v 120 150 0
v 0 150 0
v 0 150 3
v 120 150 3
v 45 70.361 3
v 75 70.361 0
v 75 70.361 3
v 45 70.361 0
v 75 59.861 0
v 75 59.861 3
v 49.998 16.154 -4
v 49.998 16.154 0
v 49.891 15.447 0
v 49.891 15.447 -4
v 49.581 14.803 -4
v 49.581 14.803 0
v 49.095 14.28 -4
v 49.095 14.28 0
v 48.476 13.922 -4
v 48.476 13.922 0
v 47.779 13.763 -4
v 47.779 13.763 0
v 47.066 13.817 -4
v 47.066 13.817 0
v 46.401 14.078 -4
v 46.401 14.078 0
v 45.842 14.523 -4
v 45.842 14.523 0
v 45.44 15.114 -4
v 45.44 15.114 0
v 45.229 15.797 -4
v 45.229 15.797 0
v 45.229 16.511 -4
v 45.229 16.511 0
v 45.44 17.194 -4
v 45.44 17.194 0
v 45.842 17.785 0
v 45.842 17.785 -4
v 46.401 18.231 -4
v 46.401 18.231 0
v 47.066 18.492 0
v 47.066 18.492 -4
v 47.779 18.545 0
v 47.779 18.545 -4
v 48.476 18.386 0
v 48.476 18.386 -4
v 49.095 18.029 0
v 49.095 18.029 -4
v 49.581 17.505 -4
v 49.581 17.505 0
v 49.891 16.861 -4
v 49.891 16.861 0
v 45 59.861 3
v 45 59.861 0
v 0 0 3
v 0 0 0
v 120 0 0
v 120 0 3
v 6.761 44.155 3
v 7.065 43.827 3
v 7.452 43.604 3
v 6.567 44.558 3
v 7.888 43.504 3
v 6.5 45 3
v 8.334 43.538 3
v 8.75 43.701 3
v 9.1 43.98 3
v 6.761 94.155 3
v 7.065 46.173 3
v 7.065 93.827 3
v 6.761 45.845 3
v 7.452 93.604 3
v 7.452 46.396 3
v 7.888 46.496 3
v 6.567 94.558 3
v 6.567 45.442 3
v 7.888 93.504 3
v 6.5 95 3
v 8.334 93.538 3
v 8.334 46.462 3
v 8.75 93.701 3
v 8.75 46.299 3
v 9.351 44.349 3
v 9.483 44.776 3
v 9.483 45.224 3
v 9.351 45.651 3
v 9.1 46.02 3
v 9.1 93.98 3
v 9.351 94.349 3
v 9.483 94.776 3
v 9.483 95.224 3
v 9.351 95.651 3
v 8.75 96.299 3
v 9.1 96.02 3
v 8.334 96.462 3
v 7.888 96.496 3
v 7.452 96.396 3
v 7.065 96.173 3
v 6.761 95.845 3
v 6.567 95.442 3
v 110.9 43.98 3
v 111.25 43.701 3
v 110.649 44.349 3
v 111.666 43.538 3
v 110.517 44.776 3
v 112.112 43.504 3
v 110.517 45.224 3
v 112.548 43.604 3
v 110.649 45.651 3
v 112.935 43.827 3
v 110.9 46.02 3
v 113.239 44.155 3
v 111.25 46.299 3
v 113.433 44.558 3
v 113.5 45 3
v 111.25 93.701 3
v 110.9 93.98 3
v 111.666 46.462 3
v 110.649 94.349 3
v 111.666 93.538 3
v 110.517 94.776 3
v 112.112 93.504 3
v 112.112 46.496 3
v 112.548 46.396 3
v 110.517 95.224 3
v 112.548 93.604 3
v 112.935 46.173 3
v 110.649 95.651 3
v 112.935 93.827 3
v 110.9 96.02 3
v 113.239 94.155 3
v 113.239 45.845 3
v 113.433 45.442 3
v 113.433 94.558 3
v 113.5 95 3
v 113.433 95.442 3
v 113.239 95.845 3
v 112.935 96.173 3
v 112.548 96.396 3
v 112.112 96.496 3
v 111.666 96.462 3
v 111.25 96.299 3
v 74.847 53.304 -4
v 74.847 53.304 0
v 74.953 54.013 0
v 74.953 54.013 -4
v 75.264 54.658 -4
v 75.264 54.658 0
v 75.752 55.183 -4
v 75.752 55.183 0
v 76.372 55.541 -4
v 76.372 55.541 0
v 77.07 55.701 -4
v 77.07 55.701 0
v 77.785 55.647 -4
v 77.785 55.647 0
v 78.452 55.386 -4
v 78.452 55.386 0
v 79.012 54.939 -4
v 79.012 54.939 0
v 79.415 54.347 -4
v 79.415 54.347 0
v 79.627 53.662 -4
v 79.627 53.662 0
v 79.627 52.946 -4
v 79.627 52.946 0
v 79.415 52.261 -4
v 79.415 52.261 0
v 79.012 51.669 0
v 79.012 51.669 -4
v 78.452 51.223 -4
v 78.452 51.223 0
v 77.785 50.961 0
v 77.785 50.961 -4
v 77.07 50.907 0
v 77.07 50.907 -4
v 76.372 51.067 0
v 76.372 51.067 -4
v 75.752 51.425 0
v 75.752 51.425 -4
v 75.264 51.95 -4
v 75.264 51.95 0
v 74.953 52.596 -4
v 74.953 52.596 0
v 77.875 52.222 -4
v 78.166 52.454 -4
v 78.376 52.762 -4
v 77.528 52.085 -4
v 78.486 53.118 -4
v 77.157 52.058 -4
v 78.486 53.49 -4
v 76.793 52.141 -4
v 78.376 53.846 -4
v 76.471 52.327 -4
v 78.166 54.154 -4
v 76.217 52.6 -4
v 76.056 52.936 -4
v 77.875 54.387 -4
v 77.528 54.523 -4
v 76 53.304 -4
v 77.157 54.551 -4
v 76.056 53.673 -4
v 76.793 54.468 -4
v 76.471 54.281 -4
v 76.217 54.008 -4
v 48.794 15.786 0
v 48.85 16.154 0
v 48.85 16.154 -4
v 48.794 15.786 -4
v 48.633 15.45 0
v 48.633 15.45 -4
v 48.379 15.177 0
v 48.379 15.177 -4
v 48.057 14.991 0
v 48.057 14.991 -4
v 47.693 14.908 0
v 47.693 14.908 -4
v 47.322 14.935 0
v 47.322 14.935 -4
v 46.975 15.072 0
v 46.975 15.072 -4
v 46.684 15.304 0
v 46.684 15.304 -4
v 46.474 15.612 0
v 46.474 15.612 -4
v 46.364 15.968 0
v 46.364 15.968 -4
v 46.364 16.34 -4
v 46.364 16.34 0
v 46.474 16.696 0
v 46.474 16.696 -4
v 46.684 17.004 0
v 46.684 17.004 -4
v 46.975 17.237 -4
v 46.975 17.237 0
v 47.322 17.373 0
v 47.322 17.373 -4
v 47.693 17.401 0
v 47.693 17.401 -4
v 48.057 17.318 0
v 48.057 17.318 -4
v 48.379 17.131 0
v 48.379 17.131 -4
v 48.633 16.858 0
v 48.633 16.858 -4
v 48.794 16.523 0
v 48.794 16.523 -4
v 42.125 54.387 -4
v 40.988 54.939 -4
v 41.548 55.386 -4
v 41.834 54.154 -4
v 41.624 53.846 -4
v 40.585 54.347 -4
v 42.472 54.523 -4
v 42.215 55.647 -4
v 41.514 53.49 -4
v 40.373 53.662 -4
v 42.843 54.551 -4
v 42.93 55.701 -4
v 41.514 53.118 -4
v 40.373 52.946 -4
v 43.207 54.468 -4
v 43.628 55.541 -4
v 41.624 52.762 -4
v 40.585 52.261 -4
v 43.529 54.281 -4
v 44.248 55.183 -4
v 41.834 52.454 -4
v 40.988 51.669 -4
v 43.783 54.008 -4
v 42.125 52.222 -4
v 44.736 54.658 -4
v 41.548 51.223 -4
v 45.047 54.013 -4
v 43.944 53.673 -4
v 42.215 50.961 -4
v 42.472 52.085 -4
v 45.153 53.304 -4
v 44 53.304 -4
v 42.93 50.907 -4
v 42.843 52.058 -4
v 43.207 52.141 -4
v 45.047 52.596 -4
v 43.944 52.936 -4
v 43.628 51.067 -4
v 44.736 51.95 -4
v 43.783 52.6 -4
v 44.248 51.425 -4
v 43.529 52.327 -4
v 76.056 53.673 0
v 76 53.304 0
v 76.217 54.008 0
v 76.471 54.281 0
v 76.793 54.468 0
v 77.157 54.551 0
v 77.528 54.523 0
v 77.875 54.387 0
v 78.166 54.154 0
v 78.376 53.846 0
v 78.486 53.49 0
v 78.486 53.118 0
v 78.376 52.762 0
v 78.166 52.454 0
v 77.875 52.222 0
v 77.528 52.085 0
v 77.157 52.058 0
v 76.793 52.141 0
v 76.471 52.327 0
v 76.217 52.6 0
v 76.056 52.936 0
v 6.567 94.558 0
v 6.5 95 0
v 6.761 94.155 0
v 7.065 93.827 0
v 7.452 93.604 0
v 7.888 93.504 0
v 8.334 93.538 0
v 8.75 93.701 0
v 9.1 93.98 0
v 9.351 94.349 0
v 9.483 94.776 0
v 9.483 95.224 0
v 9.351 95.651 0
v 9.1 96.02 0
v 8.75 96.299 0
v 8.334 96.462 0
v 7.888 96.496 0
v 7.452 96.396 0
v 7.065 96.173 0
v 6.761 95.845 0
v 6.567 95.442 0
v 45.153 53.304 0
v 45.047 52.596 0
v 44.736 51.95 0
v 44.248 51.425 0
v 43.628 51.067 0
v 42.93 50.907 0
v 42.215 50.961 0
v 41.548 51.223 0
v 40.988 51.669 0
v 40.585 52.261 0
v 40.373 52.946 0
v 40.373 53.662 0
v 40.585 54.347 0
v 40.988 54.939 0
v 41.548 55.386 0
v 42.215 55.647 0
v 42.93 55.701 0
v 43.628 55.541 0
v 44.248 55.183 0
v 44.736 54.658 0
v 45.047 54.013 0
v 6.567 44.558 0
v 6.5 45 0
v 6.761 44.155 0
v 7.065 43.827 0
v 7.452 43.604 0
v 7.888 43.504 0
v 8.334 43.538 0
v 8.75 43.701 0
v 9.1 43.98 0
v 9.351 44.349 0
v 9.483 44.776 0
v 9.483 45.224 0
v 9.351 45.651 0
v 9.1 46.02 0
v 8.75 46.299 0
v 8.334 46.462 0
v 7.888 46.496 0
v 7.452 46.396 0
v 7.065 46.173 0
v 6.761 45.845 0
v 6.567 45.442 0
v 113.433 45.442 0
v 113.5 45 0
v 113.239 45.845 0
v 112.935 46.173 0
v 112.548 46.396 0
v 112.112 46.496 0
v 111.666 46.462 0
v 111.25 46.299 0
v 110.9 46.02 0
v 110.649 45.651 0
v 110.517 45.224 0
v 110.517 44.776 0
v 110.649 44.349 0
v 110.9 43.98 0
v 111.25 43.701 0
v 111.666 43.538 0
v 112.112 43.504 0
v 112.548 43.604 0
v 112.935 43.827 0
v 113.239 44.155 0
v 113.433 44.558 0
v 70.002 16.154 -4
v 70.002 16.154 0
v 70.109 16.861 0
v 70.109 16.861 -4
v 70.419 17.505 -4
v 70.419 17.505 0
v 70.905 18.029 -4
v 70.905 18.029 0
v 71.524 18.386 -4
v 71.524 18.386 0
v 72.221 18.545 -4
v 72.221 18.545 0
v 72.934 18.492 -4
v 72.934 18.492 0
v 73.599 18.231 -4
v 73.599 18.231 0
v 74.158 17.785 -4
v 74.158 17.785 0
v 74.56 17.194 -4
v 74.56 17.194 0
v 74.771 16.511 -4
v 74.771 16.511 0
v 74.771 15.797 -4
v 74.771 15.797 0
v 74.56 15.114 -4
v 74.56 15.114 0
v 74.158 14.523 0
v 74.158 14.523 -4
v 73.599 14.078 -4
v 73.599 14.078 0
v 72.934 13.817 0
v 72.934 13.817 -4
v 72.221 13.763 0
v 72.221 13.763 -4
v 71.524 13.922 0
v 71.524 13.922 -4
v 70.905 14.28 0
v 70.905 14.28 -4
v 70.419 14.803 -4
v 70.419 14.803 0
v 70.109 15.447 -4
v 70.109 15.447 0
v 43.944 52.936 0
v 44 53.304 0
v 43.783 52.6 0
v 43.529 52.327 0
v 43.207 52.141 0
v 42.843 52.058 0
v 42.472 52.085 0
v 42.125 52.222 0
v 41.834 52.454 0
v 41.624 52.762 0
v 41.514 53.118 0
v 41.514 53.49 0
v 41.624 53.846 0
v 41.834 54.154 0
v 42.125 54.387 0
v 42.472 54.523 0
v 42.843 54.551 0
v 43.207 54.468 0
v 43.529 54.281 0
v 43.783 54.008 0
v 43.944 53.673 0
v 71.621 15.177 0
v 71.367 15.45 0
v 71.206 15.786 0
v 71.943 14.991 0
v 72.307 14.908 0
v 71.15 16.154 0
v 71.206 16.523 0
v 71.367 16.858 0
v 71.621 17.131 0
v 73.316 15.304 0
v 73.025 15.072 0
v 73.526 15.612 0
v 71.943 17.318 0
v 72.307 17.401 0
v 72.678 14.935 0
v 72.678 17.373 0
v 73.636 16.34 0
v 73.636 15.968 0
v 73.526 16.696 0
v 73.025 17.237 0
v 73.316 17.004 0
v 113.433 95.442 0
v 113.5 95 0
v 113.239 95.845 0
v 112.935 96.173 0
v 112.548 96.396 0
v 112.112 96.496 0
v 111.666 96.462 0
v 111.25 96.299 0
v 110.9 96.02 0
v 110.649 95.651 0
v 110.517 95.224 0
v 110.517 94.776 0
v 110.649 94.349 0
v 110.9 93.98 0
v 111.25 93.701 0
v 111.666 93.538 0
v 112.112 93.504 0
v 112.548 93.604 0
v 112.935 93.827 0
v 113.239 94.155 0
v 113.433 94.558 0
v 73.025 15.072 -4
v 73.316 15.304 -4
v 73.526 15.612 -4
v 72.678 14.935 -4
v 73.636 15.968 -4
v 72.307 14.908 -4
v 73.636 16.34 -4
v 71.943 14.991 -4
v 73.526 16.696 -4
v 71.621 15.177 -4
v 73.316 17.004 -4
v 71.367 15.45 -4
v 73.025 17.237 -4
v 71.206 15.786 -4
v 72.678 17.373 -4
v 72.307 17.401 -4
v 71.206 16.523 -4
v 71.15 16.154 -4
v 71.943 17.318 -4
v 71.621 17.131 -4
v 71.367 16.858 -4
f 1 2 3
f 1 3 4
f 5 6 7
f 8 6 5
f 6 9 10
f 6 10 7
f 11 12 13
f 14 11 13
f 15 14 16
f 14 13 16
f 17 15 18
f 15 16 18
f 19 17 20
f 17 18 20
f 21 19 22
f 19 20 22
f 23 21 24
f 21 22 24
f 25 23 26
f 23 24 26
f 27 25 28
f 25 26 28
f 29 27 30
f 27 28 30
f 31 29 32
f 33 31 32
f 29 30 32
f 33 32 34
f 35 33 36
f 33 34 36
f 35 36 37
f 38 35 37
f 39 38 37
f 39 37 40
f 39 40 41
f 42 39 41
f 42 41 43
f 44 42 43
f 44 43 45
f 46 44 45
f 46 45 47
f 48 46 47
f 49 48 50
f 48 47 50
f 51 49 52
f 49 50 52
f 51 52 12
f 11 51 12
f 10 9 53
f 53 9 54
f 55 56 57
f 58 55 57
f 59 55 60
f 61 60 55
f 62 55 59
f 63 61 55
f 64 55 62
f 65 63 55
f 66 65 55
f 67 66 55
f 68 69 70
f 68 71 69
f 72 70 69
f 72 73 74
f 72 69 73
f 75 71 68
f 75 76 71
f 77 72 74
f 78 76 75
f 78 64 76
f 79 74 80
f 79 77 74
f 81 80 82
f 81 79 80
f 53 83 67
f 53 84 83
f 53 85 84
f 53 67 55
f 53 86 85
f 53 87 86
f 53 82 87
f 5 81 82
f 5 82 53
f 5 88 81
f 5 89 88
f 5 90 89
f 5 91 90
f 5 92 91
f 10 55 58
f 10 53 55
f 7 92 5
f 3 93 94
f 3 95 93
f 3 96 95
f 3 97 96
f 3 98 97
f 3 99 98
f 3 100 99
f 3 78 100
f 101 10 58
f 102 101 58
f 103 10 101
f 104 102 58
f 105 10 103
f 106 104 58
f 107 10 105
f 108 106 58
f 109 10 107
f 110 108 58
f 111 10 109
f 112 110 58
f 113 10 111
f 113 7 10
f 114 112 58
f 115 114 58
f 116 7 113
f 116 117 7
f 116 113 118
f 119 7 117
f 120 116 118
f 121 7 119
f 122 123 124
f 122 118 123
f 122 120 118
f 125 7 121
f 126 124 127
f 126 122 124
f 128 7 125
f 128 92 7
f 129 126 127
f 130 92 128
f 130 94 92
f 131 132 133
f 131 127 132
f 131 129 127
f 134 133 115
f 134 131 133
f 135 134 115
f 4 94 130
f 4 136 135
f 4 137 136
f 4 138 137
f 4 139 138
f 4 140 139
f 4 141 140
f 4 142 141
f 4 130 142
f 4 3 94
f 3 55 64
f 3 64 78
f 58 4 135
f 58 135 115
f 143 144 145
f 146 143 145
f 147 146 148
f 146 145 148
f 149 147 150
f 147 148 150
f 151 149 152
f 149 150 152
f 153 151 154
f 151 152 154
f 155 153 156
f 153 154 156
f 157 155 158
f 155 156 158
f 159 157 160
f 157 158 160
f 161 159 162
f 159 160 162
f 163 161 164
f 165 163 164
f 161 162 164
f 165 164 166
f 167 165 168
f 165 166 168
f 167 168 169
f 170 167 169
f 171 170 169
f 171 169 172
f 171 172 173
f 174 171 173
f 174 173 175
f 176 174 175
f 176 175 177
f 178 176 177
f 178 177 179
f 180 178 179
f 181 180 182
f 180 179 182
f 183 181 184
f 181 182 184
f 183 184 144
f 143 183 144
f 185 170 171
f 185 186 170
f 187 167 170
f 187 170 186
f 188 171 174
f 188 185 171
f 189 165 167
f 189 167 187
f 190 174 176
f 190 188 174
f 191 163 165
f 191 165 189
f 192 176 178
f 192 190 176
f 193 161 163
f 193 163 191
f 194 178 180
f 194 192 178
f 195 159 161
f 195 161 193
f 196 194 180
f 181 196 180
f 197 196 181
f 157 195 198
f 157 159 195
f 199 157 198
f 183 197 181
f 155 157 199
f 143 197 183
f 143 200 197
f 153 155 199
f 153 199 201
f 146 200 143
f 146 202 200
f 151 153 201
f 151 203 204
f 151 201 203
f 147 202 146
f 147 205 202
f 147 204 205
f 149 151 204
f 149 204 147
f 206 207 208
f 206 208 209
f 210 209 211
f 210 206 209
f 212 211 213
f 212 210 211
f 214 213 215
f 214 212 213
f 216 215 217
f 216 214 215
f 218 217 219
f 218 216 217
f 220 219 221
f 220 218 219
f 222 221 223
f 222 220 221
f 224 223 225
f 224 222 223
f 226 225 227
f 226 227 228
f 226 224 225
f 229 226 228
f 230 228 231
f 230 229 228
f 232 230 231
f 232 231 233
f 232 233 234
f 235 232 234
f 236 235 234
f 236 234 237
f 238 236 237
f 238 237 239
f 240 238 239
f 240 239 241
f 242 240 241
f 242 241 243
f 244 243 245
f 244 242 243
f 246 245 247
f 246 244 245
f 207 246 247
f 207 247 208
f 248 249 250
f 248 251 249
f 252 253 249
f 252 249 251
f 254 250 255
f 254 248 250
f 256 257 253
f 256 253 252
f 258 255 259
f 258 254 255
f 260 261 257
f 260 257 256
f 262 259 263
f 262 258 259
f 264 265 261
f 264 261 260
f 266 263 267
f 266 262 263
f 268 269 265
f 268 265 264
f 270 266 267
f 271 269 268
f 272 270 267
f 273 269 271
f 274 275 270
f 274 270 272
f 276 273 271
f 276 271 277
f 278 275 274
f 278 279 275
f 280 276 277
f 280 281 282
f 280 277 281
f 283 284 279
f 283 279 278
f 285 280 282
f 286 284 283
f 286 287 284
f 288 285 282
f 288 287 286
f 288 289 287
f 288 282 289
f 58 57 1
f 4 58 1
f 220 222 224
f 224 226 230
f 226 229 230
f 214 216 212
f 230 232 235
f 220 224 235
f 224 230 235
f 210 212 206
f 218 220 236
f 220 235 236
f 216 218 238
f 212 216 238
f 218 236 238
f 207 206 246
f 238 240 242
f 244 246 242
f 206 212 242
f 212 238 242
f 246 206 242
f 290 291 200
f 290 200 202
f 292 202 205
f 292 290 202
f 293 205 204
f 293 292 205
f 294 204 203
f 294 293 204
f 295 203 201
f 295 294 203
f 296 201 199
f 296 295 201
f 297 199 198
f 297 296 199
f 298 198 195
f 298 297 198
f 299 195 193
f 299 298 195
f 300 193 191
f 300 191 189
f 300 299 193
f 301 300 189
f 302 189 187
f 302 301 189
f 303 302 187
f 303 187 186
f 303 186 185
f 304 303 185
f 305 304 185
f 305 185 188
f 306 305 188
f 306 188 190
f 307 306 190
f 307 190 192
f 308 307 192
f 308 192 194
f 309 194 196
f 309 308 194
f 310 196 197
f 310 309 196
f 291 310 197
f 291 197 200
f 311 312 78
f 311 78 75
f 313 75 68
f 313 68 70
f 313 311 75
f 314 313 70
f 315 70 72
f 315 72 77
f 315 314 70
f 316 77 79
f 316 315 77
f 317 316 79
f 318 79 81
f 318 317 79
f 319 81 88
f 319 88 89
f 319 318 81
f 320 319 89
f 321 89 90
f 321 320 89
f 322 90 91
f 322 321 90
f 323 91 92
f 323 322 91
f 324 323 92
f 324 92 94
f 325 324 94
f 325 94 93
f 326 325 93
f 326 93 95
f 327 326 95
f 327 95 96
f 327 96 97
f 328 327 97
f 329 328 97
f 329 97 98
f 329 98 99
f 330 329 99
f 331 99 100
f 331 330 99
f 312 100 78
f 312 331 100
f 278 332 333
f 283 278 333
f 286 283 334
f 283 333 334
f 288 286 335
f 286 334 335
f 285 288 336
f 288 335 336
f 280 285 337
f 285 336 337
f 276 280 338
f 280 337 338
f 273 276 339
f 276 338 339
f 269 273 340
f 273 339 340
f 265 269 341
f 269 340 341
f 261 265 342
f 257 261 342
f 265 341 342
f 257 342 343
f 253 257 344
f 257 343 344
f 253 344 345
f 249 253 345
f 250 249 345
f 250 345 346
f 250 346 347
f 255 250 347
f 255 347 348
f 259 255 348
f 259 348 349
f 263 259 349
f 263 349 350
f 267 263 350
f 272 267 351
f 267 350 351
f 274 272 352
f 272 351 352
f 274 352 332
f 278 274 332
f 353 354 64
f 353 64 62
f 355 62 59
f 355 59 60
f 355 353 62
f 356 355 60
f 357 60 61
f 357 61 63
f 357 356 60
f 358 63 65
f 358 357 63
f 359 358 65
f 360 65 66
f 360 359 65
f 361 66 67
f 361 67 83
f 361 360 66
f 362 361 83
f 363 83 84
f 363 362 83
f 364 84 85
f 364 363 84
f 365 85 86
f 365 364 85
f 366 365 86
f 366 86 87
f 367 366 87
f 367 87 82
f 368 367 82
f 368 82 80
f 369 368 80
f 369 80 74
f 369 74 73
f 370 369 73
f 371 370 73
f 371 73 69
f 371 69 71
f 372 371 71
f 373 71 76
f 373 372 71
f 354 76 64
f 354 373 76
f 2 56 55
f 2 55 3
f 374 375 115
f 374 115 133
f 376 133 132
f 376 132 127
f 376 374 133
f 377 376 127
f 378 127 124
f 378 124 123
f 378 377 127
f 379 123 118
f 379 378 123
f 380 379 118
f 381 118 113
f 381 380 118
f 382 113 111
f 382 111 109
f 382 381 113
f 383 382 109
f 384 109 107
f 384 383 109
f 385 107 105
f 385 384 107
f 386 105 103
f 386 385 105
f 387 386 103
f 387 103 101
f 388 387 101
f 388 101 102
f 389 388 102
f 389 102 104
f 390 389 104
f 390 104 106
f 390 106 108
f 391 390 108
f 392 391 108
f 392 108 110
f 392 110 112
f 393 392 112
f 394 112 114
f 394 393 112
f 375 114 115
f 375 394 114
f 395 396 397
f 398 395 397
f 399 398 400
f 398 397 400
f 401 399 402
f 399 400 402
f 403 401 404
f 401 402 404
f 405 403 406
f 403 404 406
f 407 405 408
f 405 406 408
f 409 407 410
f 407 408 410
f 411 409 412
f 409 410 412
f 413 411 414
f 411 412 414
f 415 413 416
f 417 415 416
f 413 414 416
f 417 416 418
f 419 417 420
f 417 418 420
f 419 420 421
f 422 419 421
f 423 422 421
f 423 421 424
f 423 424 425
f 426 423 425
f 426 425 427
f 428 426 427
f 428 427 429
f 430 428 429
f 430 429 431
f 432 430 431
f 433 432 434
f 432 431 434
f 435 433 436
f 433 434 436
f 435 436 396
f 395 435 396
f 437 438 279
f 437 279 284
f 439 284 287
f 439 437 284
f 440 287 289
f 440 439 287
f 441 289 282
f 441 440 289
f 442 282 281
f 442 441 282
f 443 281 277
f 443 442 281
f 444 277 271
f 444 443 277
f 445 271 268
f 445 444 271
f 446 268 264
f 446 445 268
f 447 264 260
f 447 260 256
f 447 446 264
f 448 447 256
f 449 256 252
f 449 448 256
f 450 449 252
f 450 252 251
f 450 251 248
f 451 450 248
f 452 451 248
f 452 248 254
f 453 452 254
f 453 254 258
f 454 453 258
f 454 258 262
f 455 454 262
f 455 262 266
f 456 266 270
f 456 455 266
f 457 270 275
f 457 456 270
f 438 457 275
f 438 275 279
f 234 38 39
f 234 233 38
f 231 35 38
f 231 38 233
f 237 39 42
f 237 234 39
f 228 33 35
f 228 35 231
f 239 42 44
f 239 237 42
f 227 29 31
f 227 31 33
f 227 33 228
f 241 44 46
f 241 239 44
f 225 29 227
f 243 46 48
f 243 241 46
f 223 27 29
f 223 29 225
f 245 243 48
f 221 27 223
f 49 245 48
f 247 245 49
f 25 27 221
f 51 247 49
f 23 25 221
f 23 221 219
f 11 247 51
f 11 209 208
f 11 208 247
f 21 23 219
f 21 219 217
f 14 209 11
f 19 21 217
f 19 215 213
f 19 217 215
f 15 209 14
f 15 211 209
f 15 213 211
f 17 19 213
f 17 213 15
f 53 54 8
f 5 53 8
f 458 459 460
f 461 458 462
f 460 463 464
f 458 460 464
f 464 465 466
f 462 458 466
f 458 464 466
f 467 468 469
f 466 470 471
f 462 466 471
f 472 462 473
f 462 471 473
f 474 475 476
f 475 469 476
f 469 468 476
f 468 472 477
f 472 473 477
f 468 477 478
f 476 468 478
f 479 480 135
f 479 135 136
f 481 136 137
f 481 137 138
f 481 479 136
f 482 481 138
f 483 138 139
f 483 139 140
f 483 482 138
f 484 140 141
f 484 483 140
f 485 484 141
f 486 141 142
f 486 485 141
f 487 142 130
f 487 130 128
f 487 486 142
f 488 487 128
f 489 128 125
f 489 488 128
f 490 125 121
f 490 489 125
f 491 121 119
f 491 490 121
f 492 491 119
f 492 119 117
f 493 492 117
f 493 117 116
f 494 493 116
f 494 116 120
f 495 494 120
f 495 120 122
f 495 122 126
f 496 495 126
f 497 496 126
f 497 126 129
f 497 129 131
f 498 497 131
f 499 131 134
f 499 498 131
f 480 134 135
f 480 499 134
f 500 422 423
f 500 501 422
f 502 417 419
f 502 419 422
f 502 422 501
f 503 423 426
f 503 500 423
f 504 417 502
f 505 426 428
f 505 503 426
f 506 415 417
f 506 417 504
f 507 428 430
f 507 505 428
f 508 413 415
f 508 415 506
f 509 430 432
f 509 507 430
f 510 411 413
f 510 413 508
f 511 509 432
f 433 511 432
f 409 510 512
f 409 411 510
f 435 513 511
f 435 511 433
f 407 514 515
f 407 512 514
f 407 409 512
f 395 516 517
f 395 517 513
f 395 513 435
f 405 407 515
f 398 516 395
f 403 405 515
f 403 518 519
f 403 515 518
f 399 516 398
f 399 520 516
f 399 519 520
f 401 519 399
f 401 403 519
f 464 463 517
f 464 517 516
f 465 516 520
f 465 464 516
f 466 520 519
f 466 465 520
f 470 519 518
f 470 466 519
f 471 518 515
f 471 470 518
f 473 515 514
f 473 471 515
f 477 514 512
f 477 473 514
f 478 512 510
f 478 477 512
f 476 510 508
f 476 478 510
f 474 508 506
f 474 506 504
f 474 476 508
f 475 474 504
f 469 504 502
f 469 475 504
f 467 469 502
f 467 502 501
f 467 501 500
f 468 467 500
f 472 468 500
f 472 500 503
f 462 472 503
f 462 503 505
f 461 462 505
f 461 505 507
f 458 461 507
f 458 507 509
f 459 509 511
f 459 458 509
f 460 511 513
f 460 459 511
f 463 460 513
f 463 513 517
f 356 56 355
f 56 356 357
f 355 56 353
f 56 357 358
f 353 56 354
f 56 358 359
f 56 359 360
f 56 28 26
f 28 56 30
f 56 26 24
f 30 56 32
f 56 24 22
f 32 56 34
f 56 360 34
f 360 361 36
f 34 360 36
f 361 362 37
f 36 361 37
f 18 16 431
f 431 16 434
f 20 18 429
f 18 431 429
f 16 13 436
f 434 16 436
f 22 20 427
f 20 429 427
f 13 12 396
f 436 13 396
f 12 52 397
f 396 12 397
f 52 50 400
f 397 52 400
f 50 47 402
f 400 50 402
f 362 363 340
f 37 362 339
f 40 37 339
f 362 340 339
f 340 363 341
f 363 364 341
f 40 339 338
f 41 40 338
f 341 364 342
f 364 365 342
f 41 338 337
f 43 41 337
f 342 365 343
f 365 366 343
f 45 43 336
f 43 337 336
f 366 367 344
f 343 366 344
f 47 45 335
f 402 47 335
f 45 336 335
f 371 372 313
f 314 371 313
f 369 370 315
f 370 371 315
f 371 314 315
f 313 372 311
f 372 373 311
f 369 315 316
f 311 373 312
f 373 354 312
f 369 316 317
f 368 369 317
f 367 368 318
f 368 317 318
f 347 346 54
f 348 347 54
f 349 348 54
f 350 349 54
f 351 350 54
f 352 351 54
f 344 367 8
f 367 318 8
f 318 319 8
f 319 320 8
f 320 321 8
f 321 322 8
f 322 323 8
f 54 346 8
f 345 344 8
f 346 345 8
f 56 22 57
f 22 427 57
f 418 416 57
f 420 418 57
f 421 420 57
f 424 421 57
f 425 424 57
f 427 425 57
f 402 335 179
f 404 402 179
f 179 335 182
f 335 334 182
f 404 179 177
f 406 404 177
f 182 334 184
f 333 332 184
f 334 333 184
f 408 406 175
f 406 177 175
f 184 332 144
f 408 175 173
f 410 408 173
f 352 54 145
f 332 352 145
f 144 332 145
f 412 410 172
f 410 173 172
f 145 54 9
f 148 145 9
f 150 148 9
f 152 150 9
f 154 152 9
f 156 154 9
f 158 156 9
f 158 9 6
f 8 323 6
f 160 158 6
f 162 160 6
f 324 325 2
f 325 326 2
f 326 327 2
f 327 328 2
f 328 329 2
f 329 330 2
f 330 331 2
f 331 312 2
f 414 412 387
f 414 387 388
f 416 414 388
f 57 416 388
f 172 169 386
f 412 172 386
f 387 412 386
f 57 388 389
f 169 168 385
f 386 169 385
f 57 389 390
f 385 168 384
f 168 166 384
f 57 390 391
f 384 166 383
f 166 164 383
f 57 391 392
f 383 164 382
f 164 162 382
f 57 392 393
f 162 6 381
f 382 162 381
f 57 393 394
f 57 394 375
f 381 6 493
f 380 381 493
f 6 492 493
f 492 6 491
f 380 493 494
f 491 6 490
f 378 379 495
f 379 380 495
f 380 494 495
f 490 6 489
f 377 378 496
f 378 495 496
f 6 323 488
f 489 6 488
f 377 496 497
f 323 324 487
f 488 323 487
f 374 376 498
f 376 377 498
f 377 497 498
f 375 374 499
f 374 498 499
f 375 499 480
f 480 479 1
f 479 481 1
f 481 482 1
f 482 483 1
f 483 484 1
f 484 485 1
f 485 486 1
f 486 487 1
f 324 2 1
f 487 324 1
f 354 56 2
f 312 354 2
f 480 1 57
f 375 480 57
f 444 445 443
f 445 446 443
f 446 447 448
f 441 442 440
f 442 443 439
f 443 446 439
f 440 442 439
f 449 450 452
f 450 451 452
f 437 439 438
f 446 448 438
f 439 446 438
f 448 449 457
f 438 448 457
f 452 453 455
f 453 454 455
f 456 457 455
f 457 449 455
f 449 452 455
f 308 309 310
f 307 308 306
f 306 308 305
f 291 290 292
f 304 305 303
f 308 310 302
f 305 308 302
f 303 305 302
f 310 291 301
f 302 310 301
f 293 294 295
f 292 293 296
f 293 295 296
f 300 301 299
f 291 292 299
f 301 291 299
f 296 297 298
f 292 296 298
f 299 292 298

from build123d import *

# Parameters (mm, degrees)
SKETCH1_W           = 120
SKETCH1_H           = 150
SKETCH1_R           = 1.5
BOSS_EXTRUDE1_DEPTH = 3
SKETCH2_R           = 2.403365395
SKETCH2_R_2         = 1.25
SKETCH2_R_3         = 2.397656746
BOSS_EXTRUDE2_DEPTH = 4
SKETCH3_W           = 30
SKETCH3_H           = 10.5
CUT_EXTRUDE1_DEPTH  = 10


with BuildPart() as part:
    # Sketch1 → Boss-Extrude1 (new body)
    with BuildSketch(Plane.XY):
        with Locations((60, 75)):
            Rectangle(SKETCH1_W, SKETCH1_H)
        with Locations((112, 95)):
            Circle(SKETCH1_R, mode=Mode.SUBTRACT)
        with Locations((112, 45)):
            Circle(SKETCH1_R, mode=Mode.SUBTRACT)
        with Locations(Location((8, 45, 0), (0, 0, 180))):
            Circle(SKETCH1_R, mode=Mode.SUBTRACT)
        with Locations(Location((8, 95, 0), (0, 0, 180))):
            Circle(SKETCH1_R, mode=Mode.SUBTRACT)
    extrude(amount=BOSS_EXTRUDE1_DEPTH)

    # Sketch2 → Boss-Extrude2 (add)
    # profile 1 of 4: a face of its own
    with BuildSketch(Plane(origin=(0, 0, 0), x_dir=(-1, 0, 0), z_dir=(0, 0, -1))):
        with Locations(Location((-42.75, 53.304125965, 0), (0, 0, 180))):
            Circle(SKETCH2_R)
        with Locations(Location((-42.75, 53.304125965, 0), (0, 0, 180))):
            Circle(SKETCH2_R_2, mode=Mode.SUBTRACT)
    # profile 2 of 4: a face of its own
    with BuildSketch(Plane(origin=(0, 0, 0), x_dir=(-1, 0, 0), z_dir=(0, 0, -1))):
        with Locations(Location((-47.6, 16.154125965, 0), (0, 0, 180))):
            Circle(SKETCH2_R_3)
        with Locations(Location((-47.6, 16.154125965, 0), (0, 0, 180))):
            Circle(SKETCH2_R_2, mode=Mode.SUBTRACT)
    # profile 3 of 4: a face of its own
    with BuildSketch(Plane(origin=(0, 0, 0), x_dir=(-1, 0, 0), z_dir=(0, 0, -1))):
        with Locations((-72.4, 16.154125965)):
            Circle(SKETCH2_R_3)
        with Locations((-72.4, 16.154125965)):
            Circle(SKETCH2_R_2, mode=Mode.SUBTRACT)
    # profile 4 of 4: a face of its own
    with BuildSketch(Plane(origin=(0, 0, 0), x_dir=(-1, 0, 0), z_dir=(0, 0, -1))):
        with Locations((-77.25, 53.304125965)):
            Circle(SKETCH2_R)
        with Locations((-77.25, 53.304125965)):
            Circle(SKETCH2_R_2, mode=Mode.SUBTRACT)
    extrude(amount=BOSS_EXTRUDE2_DEPTH)

    # Sketch3 → Cut-Extrude1 (cut)
    with BuildSketch(Plane(origin=(0, 0, 0), x_dir=(-1, 0, 0), z_dir=(0, 0, -1))):
        with Locations((-60, 65.111028977)):
            Rectangle(SKETCH3_W, SKETCH3_H)
    extrude(amount=-CUT_EXTRUDE1_DEPTH, mode=Mode.SUBTRACT)


solid = part.part
